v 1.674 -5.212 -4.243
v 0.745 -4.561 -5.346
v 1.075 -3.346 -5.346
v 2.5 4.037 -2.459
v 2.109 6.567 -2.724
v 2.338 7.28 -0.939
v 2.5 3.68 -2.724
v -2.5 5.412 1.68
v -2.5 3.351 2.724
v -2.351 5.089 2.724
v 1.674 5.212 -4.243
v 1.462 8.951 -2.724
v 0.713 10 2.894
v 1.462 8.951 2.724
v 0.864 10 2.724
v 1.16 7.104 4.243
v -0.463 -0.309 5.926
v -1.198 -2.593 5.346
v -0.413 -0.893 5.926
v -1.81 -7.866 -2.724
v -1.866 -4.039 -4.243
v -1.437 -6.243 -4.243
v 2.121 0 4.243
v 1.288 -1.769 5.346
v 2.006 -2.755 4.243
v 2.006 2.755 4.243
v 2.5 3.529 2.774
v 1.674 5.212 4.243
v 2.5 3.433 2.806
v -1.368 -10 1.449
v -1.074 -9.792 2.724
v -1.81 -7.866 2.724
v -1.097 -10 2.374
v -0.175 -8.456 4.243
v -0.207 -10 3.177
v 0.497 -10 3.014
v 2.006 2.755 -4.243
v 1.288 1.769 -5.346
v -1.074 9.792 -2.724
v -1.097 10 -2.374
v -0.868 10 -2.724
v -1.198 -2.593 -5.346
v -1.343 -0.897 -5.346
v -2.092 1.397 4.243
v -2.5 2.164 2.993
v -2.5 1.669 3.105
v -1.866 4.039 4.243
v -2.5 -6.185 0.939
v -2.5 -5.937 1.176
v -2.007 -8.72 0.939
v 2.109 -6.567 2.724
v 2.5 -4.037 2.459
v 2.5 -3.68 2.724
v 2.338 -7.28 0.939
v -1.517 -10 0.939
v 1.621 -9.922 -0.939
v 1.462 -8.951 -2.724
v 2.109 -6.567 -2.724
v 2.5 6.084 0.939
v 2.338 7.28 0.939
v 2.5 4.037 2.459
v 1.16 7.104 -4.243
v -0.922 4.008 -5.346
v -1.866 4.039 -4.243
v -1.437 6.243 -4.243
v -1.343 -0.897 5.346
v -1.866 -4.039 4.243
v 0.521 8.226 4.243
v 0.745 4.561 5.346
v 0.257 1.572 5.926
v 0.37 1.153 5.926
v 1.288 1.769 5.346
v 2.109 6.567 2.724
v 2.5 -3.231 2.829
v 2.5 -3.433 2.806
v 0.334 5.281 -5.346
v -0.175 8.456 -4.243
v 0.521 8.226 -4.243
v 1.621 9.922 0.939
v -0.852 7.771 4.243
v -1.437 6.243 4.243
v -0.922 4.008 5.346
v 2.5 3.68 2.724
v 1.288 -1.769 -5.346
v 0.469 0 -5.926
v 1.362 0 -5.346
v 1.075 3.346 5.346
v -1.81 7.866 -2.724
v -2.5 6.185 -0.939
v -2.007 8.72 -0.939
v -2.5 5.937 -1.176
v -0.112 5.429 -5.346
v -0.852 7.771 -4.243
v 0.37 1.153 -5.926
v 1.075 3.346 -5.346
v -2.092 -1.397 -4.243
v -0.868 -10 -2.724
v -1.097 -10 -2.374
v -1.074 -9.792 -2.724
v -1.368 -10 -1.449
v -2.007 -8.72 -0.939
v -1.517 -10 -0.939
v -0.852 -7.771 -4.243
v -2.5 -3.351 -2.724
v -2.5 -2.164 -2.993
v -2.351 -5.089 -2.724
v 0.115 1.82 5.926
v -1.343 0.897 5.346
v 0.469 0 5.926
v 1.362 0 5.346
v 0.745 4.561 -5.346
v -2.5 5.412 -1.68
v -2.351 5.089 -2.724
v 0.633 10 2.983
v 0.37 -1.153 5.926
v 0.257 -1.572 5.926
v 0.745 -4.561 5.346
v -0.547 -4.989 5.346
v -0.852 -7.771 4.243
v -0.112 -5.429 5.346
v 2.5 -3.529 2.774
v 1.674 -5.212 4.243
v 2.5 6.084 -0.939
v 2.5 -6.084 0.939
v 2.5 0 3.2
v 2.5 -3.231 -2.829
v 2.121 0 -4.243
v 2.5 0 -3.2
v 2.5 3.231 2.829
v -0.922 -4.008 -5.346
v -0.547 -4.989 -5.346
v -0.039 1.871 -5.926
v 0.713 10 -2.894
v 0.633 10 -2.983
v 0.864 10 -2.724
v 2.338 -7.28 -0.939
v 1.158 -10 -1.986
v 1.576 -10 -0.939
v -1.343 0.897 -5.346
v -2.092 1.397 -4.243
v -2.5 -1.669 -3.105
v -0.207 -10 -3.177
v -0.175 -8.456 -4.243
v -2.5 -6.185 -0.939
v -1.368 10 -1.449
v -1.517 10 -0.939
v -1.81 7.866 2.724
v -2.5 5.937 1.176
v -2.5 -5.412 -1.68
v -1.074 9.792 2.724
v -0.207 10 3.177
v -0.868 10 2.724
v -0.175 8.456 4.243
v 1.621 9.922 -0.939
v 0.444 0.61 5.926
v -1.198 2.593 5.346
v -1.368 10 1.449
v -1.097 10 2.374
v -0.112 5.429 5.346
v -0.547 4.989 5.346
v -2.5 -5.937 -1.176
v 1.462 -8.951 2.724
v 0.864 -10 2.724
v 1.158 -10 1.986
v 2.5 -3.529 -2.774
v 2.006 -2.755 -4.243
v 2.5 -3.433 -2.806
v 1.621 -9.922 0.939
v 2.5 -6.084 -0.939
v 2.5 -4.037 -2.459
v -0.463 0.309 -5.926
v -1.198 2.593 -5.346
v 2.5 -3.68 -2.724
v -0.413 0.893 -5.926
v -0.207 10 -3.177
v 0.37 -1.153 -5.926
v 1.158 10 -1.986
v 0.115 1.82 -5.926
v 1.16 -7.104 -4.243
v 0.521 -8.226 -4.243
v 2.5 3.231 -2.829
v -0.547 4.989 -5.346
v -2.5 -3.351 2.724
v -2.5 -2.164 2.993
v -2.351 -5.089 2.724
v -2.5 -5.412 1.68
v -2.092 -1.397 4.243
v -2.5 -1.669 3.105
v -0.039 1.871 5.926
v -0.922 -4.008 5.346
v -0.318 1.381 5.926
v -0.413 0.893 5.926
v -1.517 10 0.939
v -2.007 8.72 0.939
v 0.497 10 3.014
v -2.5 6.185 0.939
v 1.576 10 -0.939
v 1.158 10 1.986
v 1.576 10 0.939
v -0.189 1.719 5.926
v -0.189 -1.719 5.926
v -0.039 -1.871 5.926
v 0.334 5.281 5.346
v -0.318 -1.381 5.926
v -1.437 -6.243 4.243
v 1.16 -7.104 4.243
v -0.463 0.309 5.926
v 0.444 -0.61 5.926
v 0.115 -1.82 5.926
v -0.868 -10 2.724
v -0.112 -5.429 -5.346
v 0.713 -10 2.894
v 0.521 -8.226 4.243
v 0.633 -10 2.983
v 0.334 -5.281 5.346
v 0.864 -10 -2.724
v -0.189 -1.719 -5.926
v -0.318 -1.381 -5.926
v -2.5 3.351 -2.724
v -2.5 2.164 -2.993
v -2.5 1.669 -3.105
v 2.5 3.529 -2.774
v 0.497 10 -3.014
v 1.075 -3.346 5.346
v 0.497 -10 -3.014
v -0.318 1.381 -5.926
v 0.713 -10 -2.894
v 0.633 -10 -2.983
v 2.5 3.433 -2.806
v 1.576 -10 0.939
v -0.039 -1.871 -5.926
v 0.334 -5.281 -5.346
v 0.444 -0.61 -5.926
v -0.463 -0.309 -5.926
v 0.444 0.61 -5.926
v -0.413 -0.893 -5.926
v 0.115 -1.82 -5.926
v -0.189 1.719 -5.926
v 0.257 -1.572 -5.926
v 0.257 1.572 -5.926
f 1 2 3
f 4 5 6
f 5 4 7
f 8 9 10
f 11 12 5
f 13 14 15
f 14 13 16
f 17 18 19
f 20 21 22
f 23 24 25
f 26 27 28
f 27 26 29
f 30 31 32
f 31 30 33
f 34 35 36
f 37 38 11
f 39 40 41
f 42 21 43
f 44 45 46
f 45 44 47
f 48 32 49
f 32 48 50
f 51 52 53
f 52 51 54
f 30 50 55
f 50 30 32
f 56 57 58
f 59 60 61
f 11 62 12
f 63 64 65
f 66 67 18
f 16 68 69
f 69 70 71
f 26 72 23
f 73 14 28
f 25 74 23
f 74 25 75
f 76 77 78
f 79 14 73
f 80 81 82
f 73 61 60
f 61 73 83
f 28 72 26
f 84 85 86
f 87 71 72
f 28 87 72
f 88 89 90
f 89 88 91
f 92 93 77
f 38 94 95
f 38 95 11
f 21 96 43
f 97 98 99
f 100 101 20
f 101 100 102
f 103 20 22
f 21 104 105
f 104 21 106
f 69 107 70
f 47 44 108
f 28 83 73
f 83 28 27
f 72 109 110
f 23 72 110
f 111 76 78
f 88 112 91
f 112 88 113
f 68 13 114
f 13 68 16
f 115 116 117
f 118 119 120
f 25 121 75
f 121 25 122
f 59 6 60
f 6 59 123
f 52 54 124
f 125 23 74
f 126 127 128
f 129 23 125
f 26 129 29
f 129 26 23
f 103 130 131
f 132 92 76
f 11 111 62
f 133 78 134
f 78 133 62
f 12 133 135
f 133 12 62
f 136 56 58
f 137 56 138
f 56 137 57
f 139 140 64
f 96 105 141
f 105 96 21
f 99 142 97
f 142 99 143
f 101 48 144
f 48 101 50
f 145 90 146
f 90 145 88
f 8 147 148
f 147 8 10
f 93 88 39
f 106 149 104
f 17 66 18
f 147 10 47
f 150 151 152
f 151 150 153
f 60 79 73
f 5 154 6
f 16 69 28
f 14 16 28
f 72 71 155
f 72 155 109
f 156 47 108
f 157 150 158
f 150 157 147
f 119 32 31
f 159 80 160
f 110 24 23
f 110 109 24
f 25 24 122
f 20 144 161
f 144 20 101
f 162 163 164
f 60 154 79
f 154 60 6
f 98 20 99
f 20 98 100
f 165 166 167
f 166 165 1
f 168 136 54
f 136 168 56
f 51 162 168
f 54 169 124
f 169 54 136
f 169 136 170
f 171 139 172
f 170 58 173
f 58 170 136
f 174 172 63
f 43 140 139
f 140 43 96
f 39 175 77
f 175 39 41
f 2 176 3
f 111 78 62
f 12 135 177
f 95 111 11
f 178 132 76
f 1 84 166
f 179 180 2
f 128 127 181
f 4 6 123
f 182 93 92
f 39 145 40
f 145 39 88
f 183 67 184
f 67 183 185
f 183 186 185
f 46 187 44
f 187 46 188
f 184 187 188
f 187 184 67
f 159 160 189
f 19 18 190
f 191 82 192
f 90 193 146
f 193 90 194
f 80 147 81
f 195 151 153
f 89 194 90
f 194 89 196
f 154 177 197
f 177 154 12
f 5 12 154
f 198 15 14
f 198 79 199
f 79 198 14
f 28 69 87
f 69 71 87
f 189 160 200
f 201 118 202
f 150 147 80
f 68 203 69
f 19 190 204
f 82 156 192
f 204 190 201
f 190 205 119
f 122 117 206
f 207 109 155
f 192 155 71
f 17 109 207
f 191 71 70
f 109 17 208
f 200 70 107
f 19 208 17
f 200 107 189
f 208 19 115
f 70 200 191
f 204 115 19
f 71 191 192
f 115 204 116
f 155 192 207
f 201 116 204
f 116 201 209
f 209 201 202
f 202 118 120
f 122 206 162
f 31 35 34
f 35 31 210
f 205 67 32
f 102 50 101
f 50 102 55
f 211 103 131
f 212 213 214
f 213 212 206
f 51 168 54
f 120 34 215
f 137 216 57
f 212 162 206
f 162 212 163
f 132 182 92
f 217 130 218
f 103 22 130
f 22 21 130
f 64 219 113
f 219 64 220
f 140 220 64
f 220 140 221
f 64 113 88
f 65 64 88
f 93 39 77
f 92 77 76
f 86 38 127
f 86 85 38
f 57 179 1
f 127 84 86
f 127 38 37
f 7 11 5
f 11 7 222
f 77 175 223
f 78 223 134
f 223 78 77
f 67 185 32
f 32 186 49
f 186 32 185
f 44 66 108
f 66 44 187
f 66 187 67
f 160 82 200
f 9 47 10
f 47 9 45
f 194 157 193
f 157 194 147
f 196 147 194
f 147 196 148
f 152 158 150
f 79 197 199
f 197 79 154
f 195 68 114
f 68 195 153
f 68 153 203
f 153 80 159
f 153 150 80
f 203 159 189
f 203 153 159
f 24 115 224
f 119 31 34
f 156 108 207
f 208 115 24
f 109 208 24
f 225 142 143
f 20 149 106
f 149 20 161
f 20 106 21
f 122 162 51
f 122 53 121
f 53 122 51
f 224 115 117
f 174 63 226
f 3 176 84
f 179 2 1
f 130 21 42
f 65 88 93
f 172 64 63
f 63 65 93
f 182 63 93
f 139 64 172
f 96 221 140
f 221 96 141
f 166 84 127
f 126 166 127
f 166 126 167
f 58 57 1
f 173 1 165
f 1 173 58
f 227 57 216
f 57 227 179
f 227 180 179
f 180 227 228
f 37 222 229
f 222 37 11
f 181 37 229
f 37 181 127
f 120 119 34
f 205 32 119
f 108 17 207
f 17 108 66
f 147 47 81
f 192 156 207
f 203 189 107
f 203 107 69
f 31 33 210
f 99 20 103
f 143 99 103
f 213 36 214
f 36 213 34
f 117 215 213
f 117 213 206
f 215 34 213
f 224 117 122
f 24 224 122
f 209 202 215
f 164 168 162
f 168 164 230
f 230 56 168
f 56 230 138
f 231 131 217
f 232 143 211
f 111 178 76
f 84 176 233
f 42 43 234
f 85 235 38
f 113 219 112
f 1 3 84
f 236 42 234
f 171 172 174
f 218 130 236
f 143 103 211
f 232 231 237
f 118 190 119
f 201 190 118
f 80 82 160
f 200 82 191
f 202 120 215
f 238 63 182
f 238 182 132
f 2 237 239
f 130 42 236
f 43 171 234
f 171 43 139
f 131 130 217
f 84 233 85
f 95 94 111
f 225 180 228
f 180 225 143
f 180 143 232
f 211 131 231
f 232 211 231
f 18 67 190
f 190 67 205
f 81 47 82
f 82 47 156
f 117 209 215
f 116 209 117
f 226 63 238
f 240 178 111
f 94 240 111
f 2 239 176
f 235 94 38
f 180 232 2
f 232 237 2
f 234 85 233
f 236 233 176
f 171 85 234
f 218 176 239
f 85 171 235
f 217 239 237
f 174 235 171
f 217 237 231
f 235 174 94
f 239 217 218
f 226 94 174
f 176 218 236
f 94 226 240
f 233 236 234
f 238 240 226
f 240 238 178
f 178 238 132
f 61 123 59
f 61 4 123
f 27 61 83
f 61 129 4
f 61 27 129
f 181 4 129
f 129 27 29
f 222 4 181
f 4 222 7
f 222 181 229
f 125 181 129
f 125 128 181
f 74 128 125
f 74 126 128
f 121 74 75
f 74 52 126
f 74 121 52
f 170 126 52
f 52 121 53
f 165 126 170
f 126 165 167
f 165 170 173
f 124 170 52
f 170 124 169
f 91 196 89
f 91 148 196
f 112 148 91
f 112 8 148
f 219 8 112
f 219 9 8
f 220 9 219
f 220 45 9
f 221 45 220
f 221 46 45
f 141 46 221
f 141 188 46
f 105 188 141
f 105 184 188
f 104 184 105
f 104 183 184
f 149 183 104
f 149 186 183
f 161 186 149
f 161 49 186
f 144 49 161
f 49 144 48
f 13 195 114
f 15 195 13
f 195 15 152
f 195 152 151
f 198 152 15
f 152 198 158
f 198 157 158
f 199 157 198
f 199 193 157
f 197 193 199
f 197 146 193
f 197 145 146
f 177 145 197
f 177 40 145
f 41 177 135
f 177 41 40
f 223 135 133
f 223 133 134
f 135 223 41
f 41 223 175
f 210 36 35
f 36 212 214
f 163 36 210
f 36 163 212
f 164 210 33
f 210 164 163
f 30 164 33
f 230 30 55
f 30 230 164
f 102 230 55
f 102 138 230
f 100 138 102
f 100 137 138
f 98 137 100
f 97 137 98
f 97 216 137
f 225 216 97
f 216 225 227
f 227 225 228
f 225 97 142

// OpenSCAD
// Generated by generate_scads.py
scale([0.5,2.0,1.0]) {
  intersection() {
    sphere(r=6);
    cube(size=[10,10,25], center=true);
  }
}
